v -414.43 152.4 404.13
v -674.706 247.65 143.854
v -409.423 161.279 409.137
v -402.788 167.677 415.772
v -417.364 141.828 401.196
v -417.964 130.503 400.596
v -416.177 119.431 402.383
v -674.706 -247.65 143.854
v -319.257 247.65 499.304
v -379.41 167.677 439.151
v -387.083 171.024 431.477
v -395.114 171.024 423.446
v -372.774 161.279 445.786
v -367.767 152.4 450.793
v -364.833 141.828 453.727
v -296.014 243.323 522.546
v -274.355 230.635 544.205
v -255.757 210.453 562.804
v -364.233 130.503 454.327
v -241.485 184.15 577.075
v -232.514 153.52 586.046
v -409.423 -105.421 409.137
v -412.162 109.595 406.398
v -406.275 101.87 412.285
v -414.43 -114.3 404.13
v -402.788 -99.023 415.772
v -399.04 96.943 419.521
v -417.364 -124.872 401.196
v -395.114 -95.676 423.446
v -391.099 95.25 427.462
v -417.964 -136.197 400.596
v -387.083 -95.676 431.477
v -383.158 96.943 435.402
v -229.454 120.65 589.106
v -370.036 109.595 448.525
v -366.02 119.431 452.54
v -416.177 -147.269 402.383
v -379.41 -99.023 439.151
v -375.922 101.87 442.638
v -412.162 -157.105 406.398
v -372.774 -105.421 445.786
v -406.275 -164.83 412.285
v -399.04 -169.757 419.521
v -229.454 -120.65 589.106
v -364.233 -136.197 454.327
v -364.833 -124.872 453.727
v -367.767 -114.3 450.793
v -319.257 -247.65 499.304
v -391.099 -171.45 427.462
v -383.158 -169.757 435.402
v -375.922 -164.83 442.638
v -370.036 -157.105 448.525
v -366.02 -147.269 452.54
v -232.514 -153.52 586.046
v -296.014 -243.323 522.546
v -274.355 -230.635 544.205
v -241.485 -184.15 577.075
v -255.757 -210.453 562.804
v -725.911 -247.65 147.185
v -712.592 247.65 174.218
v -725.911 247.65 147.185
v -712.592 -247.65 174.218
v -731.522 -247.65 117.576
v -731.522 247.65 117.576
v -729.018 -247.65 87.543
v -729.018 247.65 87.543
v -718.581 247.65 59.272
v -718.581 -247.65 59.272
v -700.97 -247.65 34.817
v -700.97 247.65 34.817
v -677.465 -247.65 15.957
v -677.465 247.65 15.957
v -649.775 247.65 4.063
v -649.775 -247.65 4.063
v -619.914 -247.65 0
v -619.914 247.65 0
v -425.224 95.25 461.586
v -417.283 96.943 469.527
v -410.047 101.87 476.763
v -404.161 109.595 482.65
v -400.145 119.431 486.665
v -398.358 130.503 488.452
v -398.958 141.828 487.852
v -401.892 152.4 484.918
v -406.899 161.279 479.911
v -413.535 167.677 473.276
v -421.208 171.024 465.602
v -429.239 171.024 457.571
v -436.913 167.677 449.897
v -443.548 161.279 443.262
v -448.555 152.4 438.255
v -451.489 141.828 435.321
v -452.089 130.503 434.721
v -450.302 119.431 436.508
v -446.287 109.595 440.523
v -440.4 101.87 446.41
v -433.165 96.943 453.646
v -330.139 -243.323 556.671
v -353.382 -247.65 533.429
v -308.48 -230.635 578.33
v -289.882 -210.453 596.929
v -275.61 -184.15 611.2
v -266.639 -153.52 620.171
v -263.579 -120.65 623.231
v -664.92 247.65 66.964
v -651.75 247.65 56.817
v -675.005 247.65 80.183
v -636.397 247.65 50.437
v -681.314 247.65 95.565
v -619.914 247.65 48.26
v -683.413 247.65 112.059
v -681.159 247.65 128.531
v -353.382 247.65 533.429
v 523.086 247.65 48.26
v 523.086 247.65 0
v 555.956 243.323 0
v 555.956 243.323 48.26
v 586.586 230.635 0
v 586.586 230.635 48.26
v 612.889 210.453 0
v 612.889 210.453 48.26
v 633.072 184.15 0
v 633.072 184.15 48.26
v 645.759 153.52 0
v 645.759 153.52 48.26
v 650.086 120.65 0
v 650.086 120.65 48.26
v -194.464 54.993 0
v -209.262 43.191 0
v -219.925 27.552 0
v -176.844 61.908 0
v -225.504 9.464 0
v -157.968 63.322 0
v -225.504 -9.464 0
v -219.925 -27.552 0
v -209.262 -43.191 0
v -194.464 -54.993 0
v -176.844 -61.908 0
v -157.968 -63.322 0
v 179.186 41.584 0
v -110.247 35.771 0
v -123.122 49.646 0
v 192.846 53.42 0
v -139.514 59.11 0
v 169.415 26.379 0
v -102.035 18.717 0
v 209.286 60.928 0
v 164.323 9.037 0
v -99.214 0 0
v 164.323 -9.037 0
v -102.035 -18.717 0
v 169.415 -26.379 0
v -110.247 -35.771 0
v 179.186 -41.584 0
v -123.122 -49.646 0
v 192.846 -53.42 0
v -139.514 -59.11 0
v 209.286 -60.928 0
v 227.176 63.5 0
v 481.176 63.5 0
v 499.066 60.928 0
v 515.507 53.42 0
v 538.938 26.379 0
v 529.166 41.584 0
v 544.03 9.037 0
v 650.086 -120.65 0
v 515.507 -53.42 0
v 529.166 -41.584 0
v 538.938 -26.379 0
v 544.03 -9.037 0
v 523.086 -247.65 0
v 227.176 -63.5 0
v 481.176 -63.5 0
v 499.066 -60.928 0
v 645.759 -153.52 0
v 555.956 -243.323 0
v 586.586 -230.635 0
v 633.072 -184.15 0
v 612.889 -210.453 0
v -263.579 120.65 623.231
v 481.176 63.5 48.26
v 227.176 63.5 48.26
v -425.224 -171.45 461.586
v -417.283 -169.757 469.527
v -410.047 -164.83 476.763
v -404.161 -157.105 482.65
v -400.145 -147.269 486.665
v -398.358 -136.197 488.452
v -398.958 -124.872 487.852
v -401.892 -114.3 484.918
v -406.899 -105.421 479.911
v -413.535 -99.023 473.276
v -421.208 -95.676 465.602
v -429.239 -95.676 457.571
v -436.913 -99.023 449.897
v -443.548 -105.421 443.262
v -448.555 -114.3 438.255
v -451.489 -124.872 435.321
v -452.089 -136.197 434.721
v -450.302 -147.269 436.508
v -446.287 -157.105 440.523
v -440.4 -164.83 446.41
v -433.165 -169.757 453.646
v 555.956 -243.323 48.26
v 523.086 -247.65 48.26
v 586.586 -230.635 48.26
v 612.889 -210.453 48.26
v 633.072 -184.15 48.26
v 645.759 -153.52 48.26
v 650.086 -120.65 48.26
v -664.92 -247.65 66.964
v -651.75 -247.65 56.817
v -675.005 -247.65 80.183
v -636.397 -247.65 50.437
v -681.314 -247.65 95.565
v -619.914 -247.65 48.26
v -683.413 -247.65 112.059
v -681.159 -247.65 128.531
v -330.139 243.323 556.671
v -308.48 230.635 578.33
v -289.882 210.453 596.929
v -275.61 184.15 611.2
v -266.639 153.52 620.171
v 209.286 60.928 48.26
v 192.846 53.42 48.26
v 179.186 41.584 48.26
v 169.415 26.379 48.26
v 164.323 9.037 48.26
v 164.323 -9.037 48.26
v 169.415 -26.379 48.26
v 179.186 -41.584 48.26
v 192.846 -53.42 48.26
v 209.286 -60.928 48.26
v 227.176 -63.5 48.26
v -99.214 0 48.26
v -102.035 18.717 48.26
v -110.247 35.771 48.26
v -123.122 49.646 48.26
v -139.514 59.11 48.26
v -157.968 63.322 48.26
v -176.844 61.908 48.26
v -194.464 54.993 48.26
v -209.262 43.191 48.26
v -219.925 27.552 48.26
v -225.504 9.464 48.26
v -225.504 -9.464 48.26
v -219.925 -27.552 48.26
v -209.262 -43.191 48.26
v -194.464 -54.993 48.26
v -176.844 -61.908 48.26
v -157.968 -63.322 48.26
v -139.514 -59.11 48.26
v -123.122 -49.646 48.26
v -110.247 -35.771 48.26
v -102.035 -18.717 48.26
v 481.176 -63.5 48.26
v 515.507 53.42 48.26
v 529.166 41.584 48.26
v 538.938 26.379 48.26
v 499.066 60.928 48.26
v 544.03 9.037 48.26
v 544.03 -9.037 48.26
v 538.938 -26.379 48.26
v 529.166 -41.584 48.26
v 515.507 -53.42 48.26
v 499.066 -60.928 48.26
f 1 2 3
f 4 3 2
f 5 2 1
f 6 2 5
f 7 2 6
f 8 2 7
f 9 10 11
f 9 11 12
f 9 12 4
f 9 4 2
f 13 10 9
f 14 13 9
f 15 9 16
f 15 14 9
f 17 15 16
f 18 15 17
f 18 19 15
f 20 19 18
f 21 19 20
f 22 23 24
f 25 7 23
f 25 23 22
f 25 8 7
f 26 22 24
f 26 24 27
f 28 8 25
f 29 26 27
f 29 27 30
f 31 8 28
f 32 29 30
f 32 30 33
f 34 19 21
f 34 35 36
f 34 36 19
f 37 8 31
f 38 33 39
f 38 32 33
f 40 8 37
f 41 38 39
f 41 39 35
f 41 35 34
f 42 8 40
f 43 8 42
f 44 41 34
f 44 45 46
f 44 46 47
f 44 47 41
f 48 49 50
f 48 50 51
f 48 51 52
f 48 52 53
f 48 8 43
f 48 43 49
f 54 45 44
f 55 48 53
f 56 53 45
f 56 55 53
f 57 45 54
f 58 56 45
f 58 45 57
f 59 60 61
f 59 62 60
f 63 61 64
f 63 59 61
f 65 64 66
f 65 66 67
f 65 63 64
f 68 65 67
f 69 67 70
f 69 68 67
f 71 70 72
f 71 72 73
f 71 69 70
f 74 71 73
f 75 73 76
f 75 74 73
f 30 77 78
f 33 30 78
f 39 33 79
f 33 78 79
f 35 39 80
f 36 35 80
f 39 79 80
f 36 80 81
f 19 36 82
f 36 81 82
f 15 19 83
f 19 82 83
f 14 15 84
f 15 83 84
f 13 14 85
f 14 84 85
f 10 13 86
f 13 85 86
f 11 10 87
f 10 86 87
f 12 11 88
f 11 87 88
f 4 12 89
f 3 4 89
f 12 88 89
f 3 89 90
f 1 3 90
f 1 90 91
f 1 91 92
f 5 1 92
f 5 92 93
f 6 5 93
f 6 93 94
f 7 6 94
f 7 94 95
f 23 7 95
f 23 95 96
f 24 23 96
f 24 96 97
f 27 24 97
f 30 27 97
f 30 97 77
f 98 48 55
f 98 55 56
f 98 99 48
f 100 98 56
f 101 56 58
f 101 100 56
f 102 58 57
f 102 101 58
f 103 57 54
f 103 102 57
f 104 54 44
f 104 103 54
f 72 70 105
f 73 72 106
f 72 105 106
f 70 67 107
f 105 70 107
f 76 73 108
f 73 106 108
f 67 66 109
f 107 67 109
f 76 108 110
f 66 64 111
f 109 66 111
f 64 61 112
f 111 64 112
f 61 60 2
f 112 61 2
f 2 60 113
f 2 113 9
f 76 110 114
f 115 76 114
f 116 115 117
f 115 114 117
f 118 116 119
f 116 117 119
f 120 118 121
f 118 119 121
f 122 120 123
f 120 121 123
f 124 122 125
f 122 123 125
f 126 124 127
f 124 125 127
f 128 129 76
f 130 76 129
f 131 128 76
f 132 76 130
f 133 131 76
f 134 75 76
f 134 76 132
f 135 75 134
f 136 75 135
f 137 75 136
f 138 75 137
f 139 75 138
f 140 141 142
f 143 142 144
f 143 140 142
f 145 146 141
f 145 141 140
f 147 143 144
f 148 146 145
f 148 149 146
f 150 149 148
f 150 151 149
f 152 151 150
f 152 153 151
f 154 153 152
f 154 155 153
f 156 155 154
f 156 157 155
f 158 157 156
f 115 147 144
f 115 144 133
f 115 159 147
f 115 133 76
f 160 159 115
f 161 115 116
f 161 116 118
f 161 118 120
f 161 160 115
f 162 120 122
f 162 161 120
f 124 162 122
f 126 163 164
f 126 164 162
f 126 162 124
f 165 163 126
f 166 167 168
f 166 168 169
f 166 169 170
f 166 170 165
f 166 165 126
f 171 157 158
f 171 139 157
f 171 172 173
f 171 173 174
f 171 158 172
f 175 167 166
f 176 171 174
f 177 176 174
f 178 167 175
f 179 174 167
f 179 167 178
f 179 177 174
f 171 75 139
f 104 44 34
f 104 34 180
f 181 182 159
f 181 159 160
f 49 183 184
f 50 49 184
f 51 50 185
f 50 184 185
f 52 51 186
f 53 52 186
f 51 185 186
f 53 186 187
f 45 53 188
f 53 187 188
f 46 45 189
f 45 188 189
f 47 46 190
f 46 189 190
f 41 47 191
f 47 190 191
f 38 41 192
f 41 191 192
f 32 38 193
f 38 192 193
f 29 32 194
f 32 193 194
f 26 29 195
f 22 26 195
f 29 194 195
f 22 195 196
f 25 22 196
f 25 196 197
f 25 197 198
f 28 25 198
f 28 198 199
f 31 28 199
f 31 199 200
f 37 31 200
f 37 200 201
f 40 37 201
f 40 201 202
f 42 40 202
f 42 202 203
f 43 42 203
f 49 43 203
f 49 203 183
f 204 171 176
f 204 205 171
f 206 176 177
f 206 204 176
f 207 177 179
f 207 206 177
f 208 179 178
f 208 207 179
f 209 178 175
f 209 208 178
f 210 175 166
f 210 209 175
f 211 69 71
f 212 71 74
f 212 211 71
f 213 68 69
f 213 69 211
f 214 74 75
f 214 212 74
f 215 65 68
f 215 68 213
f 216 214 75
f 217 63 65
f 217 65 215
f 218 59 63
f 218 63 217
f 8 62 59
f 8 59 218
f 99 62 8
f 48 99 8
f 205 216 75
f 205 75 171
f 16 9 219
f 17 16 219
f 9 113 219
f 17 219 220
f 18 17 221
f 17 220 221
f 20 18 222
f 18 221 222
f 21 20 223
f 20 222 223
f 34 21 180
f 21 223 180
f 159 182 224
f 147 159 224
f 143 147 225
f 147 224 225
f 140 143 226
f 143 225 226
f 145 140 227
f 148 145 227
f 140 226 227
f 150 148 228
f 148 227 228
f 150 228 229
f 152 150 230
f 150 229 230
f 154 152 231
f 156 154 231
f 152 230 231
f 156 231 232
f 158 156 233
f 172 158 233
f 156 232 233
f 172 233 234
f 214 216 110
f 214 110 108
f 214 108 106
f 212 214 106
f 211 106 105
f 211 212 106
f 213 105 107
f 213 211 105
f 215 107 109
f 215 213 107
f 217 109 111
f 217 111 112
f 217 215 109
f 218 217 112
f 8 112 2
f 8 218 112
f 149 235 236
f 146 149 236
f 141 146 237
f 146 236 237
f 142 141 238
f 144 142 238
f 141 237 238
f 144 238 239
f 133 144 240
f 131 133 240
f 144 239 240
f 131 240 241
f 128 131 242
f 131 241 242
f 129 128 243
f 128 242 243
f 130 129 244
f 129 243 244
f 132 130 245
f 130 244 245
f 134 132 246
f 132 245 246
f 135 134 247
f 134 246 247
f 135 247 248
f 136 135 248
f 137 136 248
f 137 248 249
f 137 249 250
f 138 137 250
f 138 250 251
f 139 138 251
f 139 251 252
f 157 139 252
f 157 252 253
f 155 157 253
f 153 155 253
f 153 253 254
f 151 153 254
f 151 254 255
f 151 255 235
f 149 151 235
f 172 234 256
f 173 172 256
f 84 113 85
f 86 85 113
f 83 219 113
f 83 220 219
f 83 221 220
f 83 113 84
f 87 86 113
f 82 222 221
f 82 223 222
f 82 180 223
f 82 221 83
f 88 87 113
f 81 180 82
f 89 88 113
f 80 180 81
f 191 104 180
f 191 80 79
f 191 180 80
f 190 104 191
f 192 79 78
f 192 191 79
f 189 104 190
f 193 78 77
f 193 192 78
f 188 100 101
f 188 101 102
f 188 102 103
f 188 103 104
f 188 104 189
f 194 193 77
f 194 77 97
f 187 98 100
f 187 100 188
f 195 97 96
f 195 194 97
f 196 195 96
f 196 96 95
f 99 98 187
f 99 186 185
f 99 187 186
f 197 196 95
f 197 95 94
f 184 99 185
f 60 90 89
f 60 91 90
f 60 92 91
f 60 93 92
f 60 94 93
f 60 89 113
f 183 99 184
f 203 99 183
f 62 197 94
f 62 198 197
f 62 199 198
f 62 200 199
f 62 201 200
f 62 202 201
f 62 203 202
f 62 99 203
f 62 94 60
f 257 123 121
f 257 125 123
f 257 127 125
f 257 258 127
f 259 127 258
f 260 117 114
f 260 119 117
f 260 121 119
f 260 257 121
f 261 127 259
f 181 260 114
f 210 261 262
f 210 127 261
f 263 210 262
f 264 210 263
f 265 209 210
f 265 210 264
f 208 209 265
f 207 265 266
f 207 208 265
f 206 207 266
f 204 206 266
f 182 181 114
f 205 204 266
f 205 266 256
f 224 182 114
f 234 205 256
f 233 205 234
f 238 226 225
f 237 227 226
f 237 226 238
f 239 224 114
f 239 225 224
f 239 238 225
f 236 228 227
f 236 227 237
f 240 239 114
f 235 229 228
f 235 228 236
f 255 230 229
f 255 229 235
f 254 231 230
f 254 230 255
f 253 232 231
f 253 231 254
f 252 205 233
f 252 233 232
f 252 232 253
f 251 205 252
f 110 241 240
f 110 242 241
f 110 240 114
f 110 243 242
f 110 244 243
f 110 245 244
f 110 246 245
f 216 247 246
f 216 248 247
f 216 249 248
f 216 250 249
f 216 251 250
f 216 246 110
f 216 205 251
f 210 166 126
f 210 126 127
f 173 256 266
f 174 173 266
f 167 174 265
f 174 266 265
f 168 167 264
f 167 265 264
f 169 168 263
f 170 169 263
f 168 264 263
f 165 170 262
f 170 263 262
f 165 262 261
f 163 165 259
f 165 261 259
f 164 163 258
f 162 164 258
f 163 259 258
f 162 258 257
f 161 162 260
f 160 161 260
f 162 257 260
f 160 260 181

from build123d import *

# Parameters (mm, degrees)
F1_DEPTH = 247.65
F2_R     = 63.5
F3_DEPTH = 48.261
F2_W     = 254
F2_H     = 127
F4_DEPTH = 48.261
F5_R     = 38.1
F6_DEPTH = 218.44
F7_DEPTH = 218.44
F8_R     = 127


with BuildPart() as f1:
    # F0 (on Front) → F1 (new body, symmetric)
    with BuildSketch(Plane.XZ):
        with BuildLine():
            ThreePointArc((-712.5918887531, 174.2182937558), (-718.5813490984, 59.272102872), (-619.9136327213, 0))
            Line((-619.9136327213, 0), (650.0863672787, 0))
            Line((650.0863672787, 0), (650.0863672787, 48.26))
            Line((650.0863672787, 48.26), (-619.9136327213, 48.26))
            ThreePointArc((-619.9136327213, 48.26), (-675.0054873243, 80.18251504), (-674.7061432771, 143.8540927118))
            Line((-674.7061432771, 143.8540927118), (-229.4541094396, 589.1061265492))
            Line((-229.4541094396, 589.1061265492), (-263.5790826997, 623.2310998093))
            Line((-263.5790826997, 623.2310998093), (-712.5918887531, 174.2182937558))
        make_face()
    extrude(amount=F1_DEPTH, both=True)

    # F2 (on face) → F3 (cut, through all)
    with BuildSketch(Plane.XY.offset(48.26)):
        with Locations((-162.7136327213, 0)):
            Circle(F2_R)
    extrude(amount=-F3_DEPTH, mode=Mode.SUBTRACT)

    # F2 (on face) → F4 (cut, through all)
    with BuildSketch(Plane.XY.offset(48.26)):
        with Locations((354.1763672787, 0)):
            Rectangle(F2_W, F2_H)
        with BuildLine():
            ThreePointArc((227.1763672787, 63.5), (163.6763672787, 0), (227.1763672787, -63.5))
            Line((227.1763672787, -63.5), (227.1763672787, 63.5))
        make_face()
        with BuildLine():
            Line((481.1763672787, 63.5), (481.1763672787, -63.5))
            ThreePointArc((481.1763672787, -63.5), (544.6763672787, 0), (481.1763672787, 63.5))
        make_face()
    extrude(amount=-F4_DEPTH, mode=Mode.SUBTRACT)

    # F5 (on face) → F6 (cut)
    with BuildSketch(Plane(origin=(-443.4050912545, 0, 443.4050912545), x_dir=(0, -1, 0), z_dir=(-0.7071067812, 0, 0.7071067812))):
        with Locations((133.35, 25.7123801656)):
            Circle(F5_R)
    extrude(amount=-F6_DEPTH, mode=Mode.SUBTRACT)

    # F5 (on face) → F7 (cut)
    with BuildSketch(Plane(origin=(-443.4050912545, 0, 443.4050912545), x_dir=(0, -1, 0), z_dir=(-0.7071067812, 0, 0.7071067812))):
        with Locations((-133.35, 25.7123801656)):
            Circle(F5_R)
    extrude(amount=-F7_DEPTH, mode=Mode.SUBTRACT)

    # F8
    f8_edges = [f1.edges().sort_by_distance(p)[0] for p in [
        (650.086367, -247.65, 24.13),
        (650.086367, 247.65, 24.13),
        (-246.516596, -247.65, 606.168613),
        (-246.516596, 247.65, 606.168613),
    ]]
    fillet(f8_edges, radius=F8_R)


solid = f1.part
